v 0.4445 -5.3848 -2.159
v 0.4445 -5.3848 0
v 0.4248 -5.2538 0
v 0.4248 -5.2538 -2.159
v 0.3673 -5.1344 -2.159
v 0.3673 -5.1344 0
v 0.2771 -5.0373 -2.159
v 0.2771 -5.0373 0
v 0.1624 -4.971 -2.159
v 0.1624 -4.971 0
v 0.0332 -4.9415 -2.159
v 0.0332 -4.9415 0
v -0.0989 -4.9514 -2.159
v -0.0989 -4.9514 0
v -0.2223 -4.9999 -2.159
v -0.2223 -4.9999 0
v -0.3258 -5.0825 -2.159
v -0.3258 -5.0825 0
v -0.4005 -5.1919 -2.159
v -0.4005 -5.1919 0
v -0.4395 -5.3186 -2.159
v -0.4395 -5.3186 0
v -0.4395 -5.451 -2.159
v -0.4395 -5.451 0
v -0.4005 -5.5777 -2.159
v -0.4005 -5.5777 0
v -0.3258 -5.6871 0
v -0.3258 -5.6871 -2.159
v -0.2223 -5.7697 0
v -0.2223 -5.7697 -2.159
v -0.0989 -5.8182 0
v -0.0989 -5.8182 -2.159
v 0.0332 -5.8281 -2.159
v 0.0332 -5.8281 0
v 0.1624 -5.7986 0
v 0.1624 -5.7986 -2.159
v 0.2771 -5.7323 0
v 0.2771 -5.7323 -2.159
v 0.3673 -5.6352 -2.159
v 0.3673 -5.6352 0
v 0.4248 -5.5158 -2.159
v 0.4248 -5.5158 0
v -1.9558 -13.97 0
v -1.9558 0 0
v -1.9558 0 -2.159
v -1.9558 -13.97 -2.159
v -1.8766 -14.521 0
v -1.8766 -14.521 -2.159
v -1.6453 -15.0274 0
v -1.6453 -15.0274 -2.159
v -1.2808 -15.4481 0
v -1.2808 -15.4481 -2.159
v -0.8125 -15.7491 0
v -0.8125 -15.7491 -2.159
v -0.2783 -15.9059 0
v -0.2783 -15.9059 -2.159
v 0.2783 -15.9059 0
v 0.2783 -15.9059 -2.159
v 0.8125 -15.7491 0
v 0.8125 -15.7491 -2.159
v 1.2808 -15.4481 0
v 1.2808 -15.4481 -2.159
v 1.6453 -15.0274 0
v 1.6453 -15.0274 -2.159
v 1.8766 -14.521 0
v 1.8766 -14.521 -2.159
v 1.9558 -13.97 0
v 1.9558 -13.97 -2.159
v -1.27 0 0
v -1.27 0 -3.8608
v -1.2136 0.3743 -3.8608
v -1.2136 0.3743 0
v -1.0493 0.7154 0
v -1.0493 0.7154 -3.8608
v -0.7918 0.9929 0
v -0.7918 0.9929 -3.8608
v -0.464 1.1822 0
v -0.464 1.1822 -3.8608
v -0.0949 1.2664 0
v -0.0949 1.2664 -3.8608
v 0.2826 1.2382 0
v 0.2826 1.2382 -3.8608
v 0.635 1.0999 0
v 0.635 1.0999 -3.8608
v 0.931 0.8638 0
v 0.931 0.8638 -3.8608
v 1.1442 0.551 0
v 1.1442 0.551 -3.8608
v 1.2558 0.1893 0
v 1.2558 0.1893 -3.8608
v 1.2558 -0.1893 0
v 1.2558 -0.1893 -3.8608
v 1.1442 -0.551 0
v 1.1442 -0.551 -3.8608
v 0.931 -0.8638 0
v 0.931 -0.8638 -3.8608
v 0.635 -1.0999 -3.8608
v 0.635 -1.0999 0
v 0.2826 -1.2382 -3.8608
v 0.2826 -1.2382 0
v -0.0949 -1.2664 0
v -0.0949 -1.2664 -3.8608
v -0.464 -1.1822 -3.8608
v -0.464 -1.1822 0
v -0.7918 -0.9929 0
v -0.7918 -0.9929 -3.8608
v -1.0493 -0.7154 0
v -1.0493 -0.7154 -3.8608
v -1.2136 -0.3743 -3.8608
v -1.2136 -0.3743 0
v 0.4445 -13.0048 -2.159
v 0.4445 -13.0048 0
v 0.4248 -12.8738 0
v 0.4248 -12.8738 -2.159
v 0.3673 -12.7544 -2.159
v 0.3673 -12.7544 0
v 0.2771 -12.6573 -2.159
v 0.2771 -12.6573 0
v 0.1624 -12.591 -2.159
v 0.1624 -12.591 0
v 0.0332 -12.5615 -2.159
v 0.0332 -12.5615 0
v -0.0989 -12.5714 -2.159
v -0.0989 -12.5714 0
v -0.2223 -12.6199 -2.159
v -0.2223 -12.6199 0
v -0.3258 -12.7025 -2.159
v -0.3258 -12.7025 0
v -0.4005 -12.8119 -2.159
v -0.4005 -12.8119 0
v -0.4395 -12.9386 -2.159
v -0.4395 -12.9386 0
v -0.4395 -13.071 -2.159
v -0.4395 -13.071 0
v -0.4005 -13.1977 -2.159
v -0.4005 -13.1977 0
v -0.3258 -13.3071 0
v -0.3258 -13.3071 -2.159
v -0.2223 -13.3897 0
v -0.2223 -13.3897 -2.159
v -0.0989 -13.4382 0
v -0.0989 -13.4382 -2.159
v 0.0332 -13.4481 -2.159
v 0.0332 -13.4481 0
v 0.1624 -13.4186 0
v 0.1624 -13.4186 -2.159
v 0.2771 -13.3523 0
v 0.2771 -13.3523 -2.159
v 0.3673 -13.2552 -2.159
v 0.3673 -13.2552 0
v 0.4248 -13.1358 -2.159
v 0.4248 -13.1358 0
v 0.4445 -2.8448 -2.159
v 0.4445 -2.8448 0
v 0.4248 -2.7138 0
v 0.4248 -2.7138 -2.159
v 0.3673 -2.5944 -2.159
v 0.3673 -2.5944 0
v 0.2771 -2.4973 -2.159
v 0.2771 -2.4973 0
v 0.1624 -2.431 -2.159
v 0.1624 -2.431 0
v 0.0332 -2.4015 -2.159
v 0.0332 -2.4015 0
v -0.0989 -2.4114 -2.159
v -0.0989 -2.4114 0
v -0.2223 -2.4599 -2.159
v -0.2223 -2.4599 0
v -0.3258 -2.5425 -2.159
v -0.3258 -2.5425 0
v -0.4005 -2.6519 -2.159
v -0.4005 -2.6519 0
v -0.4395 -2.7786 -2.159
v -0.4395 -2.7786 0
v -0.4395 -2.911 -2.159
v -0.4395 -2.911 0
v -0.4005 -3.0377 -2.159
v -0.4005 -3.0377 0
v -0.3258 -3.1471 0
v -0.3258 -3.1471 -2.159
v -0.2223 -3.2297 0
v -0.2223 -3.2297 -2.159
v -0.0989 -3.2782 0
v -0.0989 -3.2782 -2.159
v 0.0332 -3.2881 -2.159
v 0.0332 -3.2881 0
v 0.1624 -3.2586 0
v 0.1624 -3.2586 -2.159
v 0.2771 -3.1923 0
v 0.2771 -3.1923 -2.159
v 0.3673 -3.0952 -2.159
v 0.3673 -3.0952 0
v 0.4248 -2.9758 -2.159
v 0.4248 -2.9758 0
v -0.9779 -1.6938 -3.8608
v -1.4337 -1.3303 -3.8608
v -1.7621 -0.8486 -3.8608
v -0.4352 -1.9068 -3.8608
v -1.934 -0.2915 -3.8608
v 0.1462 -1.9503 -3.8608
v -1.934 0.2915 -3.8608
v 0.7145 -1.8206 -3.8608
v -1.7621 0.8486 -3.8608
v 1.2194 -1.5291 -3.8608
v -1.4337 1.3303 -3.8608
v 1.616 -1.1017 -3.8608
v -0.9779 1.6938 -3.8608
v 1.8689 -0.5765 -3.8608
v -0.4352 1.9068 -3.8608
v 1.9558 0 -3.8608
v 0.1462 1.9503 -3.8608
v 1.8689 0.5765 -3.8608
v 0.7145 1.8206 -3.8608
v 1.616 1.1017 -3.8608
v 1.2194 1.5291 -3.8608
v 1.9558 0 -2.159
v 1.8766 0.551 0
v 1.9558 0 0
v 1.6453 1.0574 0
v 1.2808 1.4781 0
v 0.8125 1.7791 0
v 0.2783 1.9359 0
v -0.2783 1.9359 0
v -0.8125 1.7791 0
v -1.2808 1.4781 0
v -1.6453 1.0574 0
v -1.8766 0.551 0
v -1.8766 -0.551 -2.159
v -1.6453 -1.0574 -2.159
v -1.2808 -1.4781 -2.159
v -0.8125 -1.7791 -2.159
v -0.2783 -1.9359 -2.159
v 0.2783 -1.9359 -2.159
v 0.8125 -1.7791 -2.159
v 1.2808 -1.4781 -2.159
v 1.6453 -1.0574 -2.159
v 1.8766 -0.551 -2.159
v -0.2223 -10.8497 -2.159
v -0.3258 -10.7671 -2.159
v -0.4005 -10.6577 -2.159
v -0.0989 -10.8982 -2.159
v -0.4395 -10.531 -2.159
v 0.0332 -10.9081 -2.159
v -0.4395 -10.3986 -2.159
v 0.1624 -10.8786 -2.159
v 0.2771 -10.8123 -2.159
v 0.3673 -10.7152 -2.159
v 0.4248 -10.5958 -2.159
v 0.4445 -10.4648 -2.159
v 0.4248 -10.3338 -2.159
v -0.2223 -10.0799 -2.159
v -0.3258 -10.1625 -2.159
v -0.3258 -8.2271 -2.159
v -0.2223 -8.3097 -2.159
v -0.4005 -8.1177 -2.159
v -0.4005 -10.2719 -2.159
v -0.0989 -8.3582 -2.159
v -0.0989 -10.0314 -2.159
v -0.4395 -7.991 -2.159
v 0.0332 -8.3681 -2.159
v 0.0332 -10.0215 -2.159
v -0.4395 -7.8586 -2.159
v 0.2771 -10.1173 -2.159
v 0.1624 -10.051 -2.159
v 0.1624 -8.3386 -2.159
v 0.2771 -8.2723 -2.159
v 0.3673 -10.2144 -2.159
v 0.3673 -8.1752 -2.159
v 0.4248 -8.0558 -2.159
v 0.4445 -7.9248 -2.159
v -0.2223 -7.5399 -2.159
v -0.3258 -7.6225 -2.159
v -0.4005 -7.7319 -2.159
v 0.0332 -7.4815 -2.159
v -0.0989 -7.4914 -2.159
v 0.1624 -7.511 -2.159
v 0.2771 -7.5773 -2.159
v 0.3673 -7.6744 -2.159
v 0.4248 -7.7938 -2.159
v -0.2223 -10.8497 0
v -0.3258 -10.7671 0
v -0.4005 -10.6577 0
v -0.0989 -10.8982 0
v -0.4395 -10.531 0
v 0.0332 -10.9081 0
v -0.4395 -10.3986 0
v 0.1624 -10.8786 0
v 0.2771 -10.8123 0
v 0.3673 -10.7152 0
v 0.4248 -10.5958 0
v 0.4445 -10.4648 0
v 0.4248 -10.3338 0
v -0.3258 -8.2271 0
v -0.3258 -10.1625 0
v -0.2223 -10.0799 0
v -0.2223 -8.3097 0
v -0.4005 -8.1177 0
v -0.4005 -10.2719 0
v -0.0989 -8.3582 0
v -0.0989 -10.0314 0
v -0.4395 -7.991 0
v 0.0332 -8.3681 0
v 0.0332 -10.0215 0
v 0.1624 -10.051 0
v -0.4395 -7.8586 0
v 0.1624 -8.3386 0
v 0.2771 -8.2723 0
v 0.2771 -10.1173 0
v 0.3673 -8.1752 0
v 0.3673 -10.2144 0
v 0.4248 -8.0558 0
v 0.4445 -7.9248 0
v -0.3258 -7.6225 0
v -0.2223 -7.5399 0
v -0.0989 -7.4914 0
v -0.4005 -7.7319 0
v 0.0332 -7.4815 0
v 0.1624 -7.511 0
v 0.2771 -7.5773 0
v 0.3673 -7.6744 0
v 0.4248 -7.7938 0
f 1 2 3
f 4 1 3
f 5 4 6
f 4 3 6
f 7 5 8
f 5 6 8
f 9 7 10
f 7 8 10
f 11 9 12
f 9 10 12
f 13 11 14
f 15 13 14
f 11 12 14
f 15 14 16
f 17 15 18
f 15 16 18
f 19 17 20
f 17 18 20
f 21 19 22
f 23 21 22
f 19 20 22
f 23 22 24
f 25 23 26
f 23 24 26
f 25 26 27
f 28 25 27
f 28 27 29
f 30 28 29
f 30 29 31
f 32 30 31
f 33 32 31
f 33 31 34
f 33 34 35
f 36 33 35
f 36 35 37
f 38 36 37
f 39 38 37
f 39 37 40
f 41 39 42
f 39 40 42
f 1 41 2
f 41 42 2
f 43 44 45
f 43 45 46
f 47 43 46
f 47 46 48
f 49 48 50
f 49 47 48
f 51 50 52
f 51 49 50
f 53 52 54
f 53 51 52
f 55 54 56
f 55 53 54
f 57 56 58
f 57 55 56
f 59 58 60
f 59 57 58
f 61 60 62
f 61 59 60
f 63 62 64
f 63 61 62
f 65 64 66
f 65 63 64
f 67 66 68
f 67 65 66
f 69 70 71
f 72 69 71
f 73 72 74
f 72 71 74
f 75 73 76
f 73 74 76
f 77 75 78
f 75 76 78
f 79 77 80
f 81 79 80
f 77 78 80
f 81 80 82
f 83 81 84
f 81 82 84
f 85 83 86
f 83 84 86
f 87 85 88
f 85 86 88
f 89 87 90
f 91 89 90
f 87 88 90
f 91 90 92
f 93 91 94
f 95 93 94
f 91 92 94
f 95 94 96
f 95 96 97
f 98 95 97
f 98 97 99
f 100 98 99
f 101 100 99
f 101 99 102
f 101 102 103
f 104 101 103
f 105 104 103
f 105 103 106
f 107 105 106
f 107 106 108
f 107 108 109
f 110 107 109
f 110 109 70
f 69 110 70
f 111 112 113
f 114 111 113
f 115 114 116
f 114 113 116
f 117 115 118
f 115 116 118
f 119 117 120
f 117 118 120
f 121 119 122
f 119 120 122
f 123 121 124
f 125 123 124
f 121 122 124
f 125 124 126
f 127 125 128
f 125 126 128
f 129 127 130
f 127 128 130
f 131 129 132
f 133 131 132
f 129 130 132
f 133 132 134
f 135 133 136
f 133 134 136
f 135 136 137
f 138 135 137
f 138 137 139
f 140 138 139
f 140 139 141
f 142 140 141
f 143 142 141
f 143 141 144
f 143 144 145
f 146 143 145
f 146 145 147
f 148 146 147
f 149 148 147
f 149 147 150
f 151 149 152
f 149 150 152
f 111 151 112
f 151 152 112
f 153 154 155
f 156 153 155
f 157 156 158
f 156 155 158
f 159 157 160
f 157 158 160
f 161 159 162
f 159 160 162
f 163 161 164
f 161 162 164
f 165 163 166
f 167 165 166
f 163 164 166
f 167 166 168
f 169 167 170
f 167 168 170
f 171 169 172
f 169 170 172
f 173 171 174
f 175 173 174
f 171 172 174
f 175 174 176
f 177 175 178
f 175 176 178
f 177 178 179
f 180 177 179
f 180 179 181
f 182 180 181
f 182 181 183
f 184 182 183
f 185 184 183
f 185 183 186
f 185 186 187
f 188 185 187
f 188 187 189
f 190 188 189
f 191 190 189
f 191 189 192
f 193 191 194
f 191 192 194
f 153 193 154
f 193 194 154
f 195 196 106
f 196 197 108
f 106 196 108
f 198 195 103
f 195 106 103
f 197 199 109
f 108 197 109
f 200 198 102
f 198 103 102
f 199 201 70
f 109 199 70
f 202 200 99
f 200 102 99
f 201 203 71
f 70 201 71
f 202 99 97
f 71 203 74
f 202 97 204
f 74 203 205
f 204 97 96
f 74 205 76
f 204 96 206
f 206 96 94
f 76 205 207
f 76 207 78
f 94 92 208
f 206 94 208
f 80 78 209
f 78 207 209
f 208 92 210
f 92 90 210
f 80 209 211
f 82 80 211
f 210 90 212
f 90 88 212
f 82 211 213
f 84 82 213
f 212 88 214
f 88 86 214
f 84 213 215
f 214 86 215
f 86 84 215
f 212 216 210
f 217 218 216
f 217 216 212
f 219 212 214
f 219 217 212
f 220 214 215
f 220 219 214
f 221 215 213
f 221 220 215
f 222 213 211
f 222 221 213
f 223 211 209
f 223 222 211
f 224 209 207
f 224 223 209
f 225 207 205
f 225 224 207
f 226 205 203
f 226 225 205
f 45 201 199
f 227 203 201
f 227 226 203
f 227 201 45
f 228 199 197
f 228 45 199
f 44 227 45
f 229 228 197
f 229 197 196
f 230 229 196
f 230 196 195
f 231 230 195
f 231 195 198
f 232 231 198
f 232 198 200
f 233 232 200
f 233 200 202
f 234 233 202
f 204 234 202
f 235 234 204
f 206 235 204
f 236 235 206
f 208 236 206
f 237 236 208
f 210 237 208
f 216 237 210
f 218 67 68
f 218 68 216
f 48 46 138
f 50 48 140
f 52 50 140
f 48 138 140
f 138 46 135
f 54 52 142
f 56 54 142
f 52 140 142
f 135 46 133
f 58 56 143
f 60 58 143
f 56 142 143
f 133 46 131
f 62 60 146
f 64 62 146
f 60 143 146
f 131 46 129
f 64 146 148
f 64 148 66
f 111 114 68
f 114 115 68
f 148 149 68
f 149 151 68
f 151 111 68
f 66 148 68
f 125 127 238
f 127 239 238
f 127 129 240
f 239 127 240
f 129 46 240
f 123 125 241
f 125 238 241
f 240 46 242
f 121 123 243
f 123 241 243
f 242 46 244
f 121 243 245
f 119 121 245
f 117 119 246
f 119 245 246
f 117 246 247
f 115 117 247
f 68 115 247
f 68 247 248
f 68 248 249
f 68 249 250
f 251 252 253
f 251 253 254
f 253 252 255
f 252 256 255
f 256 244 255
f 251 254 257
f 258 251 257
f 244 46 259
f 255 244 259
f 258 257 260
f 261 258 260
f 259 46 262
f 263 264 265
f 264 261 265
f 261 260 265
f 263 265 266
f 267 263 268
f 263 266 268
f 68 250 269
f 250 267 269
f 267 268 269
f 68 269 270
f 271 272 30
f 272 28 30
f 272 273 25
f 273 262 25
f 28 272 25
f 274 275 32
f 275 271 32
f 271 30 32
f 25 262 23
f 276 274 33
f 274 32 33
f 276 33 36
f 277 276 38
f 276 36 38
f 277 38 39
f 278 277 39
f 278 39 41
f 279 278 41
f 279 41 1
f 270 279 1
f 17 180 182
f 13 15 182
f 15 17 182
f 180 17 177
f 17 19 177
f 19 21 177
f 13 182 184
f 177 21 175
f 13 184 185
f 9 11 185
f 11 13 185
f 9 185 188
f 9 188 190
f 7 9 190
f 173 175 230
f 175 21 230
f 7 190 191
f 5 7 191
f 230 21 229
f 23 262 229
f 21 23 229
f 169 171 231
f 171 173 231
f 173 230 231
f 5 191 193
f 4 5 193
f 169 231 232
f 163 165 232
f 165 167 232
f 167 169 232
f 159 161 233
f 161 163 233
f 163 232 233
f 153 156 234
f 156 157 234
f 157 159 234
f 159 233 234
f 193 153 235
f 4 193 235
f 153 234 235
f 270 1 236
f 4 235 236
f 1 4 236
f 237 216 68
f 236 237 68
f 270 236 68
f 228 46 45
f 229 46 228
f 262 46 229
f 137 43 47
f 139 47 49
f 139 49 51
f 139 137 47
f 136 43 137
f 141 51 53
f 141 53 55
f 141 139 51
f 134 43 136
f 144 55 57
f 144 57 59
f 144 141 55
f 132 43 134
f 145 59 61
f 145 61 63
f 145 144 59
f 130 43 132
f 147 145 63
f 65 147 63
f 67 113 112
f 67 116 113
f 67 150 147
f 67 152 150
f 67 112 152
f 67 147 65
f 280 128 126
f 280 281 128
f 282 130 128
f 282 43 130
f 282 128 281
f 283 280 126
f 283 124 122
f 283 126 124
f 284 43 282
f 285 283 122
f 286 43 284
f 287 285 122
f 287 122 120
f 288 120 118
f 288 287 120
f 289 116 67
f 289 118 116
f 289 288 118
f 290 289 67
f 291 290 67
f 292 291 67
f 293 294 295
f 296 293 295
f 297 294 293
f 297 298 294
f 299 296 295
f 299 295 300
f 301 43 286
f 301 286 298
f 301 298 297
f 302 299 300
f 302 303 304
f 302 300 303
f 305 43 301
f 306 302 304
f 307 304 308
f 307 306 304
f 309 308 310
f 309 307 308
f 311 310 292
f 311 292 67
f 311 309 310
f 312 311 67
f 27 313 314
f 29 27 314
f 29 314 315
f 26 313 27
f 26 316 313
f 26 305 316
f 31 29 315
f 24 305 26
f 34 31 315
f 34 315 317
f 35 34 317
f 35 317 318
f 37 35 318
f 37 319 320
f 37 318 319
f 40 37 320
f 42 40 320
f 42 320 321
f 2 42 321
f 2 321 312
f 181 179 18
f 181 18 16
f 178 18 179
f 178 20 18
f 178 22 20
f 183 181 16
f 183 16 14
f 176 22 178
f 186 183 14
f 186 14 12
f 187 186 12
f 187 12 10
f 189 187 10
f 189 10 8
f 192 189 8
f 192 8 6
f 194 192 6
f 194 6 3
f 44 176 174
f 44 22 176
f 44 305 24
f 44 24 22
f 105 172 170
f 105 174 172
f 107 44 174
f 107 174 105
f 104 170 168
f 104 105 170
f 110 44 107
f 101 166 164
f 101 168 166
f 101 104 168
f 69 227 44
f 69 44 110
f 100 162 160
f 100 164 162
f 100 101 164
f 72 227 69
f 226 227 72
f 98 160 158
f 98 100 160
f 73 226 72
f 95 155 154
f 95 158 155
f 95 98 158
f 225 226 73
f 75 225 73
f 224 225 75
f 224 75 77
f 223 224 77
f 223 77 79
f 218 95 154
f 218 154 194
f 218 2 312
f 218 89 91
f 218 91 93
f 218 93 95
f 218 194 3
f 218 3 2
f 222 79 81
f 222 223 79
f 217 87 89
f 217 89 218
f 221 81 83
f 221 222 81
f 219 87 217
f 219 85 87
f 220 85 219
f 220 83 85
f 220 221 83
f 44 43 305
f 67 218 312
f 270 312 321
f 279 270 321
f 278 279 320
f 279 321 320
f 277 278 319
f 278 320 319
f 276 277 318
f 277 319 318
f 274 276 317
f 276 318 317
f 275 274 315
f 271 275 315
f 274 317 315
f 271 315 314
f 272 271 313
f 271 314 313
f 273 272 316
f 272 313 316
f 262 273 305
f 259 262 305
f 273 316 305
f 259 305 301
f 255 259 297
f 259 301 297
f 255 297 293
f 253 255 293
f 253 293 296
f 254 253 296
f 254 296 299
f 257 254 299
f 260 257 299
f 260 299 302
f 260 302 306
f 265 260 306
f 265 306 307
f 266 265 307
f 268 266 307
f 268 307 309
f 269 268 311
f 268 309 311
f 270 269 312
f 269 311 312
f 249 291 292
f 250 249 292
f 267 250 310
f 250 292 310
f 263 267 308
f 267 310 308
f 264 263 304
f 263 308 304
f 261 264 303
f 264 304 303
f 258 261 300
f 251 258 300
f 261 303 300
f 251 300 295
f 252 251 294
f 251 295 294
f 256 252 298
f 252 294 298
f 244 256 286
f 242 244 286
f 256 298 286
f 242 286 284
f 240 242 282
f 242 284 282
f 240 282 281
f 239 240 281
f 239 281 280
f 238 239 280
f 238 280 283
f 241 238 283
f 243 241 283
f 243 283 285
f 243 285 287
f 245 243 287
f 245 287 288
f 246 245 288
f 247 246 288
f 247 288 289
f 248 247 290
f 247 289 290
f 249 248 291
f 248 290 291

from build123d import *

# Parameters (mm, degrees)
SKETCH1_R           = 0.4445
BOSS_EXTRUDE1_DEPTH = 2.159
SKETCH1_3_R         = 1.9558
BOSS_EXTRUDE2_DEPTH = 3.8608
SKETCH2_R           = 1.27
CUT_EXTRUDE1_DEPTH  = 17.503394679


with BuildPart() as part:
    # Sketch1 → Boss-Extrude1 (new body)
    with BuildSketch(Plane.XY):
        with BuildLine():
            Line((1.9558, -13.97), (1.9558, 0))
            ThreePointArc((1.9558, 0), (0, -1.9558), (-1.9558, 0))
            Line((-1.9558, 0), (-1.9558, -13.97))
            ThreePointArc((-1.9558, -13.97), (0, -15.9258), (1.9558, -13.97))
        make_face()
        with Locations((0, -10.4648)):
            Circle(SKETCH1_R, mode=Mode.SUBTRACT)
        with Locations((0, -7.9248)):
            Circle(SKETCH1_R, mode=Mode.SUBTRACT)
        with Locations((0, -13.0048)):
            Circle(SKETCH1_R, mode=Mode.SUBTRACT)
        with Locations((0, -5.3848)):
            Circle(SKETCH1_R, mode=Mode.SUBTRACT)
        with Locations((0, -2.8448)):
            Circle(SKETCH1_R, mode=Mode.SUBTRACT)
    extrude(amount=-BOSS_EXTRUDE1_DEPTH)

    # Sketch1<3> → Boss-Extrude2 (add)
    with BuildSketch(Plane.XY):
        Circle(SKETCH1_3_R)
    extrude(amount=-BOSS_EXTRUDE2_DEPTH)

    # Sketch2 → Cut-Extrude1 (cut, through all)
    with BuildSketch(Plane(origin=(0, 0, -3.8608), x_dir=(-1, 0, 0), z_dir=(0, 0, -1))):
        Circle(SKETCH2_R)
    extrude(amount=-CUT_EXTRUDE1_DEPTH, mode=Mode.SUBTRACT)


solid = part.part
